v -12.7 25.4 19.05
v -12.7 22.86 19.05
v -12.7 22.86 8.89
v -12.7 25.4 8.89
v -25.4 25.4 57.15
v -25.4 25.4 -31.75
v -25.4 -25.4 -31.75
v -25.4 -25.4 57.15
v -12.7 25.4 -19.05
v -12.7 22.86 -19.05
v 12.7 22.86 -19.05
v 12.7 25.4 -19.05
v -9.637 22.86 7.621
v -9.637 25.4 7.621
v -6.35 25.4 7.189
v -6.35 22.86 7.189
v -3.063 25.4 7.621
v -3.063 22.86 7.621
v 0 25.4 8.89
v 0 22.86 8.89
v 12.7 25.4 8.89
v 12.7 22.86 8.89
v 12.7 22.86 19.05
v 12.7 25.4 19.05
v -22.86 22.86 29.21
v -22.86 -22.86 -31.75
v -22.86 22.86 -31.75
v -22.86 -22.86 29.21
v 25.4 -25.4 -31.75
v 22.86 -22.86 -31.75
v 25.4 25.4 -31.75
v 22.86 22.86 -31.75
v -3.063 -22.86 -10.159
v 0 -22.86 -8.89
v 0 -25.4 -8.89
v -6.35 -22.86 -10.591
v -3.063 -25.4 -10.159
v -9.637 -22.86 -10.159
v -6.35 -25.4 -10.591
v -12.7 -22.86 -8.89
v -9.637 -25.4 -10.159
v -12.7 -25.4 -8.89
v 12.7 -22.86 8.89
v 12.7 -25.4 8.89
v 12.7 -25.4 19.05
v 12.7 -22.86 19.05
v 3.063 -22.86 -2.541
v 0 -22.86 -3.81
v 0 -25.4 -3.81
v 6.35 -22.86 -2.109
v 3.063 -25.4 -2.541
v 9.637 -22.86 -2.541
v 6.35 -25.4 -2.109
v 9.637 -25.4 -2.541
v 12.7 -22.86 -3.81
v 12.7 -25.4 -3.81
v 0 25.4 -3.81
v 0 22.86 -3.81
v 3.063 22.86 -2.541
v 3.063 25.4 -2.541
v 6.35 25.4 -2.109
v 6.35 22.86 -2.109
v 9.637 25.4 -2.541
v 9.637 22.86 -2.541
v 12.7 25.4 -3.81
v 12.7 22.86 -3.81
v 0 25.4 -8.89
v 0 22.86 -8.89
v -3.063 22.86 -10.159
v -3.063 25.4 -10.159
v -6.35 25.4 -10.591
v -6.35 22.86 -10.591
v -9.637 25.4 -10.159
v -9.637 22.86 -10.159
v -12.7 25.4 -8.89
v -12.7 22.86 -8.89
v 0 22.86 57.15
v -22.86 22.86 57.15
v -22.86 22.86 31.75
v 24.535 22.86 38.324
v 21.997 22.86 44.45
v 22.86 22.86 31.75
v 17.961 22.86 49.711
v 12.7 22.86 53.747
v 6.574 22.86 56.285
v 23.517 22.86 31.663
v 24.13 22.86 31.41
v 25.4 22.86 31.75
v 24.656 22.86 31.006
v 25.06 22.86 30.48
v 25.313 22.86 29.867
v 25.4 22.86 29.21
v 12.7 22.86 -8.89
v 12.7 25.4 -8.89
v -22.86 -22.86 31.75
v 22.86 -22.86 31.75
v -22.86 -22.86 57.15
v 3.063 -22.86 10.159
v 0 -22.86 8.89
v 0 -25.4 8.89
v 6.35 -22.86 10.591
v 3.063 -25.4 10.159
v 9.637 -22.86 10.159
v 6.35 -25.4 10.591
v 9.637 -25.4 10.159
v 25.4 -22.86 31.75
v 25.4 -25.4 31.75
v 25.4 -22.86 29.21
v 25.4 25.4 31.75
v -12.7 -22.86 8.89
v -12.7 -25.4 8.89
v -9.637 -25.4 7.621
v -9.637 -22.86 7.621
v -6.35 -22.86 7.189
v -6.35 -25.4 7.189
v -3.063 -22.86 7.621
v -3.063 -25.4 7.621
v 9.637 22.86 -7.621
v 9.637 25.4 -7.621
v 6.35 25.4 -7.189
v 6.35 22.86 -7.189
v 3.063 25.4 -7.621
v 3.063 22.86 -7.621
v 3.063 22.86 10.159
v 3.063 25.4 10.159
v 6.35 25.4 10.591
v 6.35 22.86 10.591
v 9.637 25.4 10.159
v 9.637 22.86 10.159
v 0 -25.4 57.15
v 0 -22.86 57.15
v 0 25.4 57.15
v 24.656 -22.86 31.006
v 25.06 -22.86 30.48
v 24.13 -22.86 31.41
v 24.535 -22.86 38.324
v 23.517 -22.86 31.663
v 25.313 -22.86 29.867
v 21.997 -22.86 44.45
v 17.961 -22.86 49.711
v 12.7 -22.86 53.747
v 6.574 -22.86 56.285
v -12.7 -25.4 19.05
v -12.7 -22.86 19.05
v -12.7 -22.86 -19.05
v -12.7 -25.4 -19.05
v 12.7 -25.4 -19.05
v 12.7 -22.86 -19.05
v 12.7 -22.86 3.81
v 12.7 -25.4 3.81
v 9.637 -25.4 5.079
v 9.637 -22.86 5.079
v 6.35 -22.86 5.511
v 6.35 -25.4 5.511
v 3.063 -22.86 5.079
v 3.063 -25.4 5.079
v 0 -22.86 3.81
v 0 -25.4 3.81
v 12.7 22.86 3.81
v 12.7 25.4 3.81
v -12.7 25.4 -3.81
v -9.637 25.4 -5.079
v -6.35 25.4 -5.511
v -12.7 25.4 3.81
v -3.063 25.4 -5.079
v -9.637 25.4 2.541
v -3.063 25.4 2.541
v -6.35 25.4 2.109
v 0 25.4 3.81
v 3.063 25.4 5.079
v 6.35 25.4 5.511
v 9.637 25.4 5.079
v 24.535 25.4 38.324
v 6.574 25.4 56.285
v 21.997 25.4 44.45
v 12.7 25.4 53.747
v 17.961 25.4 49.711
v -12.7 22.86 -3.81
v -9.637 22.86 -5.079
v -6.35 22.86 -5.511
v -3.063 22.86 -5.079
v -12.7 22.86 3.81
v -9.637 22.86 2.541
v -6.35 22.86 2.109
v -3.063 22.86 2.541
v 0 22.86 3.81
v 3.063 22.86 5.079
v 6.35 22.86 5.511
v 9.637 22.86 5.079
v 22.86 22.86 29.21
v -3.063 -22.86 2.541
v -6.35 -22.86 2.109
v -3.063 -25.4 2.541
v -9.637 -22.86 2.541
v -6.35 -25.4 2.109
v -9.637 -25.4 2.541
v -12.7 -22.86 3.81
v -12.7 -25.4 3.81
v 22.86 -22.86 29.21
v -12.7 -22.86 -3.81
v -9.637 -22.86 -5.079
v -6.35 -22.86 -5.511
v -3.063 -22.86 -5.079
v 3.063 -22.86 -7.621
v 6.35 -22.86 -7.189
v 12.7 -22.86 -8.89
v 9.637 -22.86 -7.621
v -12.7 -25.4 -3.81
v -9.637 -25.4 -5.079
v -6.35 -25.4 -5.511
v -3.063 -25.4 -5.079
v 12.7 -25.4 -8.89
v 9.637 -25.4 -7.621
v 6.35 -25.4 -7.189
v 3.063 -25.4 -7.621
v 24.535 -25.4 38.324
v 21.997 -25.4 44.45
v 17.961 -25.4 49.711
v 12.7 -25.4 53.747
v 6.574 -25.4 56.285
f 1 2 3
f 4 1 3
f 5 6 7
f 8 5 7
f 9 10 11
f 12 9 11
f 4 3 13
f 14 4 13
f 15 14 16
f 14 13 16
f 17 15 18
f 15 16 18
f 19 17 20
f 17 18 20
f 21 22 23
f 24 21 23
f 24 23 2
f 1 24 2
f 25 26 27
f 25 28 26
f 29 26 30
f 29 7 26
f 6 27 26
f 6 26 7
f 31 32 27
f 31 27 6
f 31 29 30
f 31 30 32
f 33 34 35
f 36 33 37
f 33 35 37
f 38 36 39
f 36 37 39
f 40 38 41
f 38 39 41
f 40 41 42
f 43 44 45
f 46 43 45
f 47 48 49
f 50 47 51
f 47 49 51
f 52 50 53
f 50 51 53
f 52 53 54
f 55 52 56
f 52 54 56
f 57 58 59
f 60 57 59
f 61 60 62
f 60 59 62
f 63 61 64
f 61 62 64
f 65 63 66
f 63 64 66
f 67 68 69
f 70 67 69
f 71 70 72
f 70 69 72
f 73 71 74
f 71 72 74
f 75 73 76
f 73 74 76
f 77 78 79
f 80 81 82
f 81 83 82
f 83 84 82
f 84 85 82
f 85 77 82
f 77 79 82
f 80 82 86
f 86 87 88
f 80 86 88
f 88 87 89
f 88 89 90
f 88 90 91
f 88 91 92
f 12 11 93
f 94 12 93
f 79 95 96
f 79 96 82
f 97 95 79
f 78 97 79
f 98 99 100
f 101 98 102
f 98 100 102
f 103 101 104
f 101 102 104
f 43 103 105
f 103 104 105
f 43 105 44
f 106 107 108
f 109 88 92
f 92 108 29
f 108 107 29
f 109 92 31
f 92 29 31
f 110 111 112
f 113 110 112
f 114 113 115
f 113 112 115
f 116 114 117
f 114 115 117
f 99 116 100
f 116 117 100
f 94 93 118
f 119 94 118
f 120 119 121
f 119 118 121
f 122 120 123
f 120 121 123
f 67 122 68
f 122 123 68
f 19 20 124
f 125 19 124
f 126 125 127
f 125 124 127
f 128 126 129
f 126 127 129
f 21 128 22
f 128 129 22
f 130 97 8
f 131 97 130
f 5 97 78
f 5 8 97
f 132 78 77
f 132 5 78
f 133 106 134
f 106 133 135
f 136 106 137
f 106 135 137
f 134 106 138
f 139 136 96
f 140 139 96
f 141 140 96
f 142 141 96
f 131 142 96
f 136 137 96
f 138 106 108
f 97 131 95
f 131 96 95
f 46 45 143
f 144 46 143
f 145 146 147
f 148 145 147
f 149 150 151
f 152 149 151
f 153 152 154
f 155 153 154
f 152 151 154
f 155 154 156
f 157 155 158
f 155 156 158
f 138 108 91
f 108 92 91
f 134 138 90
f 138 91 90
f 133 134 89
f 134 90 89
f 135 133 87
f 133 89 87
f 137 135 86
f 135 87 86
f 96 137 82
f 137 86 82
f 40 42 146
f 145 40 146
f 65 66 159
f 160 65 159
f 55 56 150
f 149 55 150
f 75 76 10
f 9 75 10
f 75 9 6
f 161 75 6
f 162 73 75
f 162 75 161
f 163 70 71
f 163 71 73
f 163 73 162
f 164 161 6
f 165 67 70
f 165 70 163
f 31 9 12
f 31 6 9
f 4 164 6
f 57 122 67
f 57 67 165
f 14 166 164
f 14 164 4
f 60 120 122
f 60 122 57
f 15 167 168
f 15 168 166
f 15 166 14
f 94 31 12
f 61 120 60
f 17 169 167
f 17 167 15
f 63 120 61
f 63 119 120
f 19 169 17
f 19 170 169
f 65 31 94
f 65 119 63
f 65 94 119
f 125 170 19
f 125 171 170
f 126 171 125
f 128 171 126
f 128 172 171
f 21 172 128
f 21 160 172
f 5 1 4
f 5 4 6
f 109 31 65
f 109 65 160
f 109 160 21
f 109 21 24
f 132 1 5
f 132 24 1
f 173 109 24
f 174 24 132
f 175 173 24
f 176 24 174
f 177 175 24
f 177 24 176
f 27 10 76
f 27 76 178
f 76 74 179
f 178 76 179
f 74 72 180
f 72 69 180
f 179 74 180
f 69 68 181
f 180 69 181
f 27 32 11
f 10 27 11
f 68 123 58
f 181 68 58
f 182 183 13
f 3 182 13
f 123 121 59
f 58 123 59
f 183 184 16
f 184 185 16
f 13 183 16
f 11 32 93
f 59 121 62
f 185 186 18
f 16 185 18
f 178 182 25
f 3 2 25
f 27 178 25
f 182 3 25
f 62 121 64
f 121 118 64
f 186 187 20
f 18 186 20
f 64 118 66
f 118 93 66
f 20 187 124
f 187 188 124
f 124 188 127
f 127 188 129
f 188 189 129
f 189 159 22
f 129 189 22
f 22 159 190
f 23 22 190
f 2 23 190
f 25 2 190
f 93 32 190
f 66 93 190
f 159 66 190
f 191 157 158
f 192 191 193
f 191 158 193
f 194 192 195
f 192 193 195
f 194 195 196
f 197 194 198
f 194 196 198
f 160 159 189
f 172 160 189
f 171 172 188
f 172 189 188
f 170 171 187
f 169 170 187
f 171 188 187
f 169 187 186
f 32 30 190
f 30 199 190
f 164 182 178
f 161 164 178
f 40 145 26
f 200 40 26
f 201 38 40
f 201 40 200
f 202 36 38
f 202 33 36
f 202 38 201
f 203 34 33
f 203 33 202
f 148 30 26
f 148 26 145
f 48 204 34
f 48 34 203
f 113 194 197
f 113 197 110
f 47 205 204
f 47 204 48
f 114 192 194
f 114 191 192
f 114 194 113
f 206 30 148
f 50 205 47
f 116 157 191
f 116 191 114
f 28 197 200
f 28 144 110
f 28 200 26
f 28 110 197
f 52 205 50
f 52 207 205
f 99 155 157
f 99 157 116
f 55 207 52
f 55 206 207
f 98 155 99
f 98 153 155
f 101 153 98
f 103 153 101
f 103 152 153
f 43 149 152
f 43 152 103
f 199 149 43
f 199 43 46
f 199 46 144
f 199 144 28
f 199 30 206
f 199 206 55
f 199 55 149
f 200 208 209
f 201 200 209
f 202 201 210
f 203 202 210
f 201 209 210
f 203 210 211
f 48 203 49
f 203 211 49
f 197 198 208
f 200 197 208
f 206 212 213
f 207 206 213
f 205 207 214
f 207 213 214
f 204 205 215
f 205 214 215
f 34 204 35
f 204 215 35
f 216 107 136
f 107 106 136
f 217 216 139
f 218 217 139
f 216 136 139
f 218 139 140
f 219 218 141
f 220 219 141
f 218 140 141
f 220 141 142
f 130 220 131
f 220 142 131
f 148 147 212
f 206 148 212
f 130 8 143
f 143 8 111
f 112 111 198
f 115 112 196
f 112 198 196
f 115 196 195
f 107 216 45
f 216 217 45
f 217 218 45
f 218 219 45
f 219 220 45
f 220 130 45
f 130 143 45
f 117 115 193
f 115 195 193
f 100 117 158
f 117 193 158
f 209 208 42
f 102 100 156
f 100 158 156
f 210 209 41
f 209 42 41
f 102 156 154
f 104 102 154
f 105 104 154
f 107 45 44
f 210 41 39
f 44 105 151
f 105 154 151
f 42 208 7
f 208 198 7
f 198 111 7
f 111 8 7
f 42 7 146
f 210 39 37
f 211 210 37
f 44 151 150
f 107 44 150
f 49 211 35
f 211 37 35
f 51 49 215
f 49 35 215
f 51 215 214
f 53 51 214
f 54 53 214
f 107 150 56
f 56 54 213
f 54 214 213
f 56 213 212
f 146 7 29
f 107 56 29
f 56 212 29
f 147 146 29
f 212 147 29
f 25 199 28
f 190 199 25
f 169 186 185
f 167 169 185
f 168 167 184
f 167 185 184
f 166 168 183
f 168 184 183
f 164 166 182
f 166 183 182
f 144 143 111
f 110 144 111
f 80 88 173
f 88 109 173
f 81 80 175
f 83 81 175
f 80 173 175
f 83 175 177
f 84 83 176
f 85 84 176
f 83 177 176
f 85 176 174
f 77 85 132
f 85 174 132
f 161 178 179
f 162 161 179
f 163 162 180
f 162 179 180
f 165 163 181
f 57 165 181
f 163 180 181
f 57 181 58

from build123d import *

# Parameters (mm, degrees)
F0_W     = 50.8
F0_H     = 63.5
F1_DEPTH = 25.4
F2_T     = -2.54
F4_DEPTH = 25.4
F5_R     = 25.4
F6_R     = 2.54
F8_DEPTH = 50.8


with BuildPart() as f1:
    # F0 (on Right) → F1 (new body, symmetric)
    with BuildSketch(Plane.YZ):
        Rectangle(F0_W, F0_H)
        Polygon((12.7, -2.54), (12.7, -12.7), (-12.7, -12.7), (-12.7, -2.54), (-12.7, 2.54), (-12.7, 10.16), (-12.7, 15.24), (-12.7, 25.4), (12.7, 25.4), (12.7, 15.24), (12.7, 10.16), (12.7, 2.54), align=None, mode=Mode.SUBTRACT)
        with BuildLine():
            Line((-12.7, -12.7), (12.7, -12.7))
            Line((12.7, -12.7), (12.7, -2.54))
            ThreePointArc((12.7, -2.54), (6.35, -0.8385226281), (0, -2.54))
            ThreePointArc((0, -2.54), (-6.35, -4.2414773719), (-12.7, -2.54))
            Line((-12.7, -2.54), (-12.7, -12.7))
        make_face()
        with BuildLine():
            ThreePointArc((0, 15.24), (6.35, 16.9414773719), (12.7, 15.24))
            Line((12.7, 15.24), (12.7, 25.4))
            Line((12.7, 25.4), (-12.7, 25.4))
            Line((-12.7, 25.4), (-12.7, 15.24))
            ThreePointArc((-12.7, 15.24), (-6.35, 13.5385226281), (0, 15.24))
        make_face()
        with BuildLine():
            ThreePointArc((0, 2.54), (6.35, 4.2414773719), (12.7, 2.54))
            Line((12.7, 2.54), (12.7, 10.16))
            ThreePointArc((12.7, 10.16), (6.35, 11.8614773719), (0, 10.16))
            ThreePointArc((0, 10.16), (-6.35, 8.4585226281), (-12.7, 10.16))
            Line((-12.7, 10.16), (-12.7, 2.54))
            ThreePointArc((-12.7, 2.54), (-6.35, 0.8385226281), (0, 2.54))
        make_face()
        with BuildLine():
            ThreePointArc((0, 10.16), (6.35, 11.8614773719), (12.7, 10.16))
            Line((12.7, 10.16), (12.7, 15.24))
            ThreePointArc((12.7, 15.24), (6.35, 16.9414773719), (0, 15.24))
            ThreePointArc((0, 15.24), (-6.35, 13.5385226281), (-12.7, 15.24))
            Line((-12.7, 15.24), (-12.7, 10.16))
            ThreePointArc((-12.7, 10.16), (-6.35, 8.4585226281), (0, 10.16))
        make_face()
        with BuildLine():
            ThreePointArc((0, -2.54), (6.35, -0.8385226281), (12.7, -2.54))
            Line((12.7, -2.54), (12.7, 2.54))
            ThreePointArc((12.7, 2.54), (6.35, 4.2414773719), (0, 2.54))
            ThreePointArc((0, 2.54), (-6.35, 0.8385226281), (-12.7, 2.54))
            Line((-12.7, 2.54), (-12.7, -2.54))
            ThreePointArc((-12.7, -2.54), (-6.35, -4.2414773719), (0, -2.54))
        make_face()
    extrude(amount=F1_DEPTH, both=True)

    # F2
    f2_openings = [f1.faces().sort_by_distance(p)[0] for p in [
        (0, 0, -31.75),
    ]]
    offset(amount=F2_T, openings=f2_openings)

    # F3 (on face) → F4 (join)
    with BuildSketch(Plane.XY.offset(31.75)):
        Polygon((25.4, -25.4), (25.4, -22.86), (-22.86, -22.86), (-22.86, 22.86), (25.4, 22.86), (25.4, 25.4), (-25.4, 25.4), (-25.4, -25.4), align=None)
    extrude(amount=F4_DEPTH)

    # F5
    f5_edges = [f1.edges().sort_by_distance(p)[0] for p in [
        (25.4, -24.13, 57.15),
        (25.4, 24.13, 57.15),
    ]]
    fillet(f5_edges, radius=F5_R)

    # F6
    f6_edges = [f1.edges().sort_by_distance(p)[0] for p in [
        (25.4, 0, 31.75),
    ]]
    fillet(f6_edges, radius=F6_R)

    # F7 (on face) → F8 (cut)
    with BuildSketch(Plane.XZ.offset(25.4)):
        with BuildLine():
            Line((-12.7, 19.05), (-12.7, 8.89))
            ThreePointArc((-12.7, 8.89), (-6.35, 7.1885226281), (0, 8.89))
            ThreePointArc((0, 8.89), (6.35, 10.5914773719), (12.7, 8.89))
            Line((12.7, 8.89), (12.7, 19.05))
            Line((12.7, 19.05), (-12.7, 19.05))
        make_face()
        with BuildLine():
            Line((-12.7, 3.81), (-12.7, -3.81))
            ThreePointArc((-12.7, -3.81), (-6.35, -5.5114773719), (0, -3.81))
            ThreePointArc((0, -3.81), (6.35, -2.1085226281), (12.7, -3.81))
            Line((12.7, -3.81), (12.7, 3.81))
            ThreePointArc((12.7, 3.81), (6.35, 5.5114773719), (0, 3.81))
            ThreePointArc((0, 3.81), (-6.35, 2.1085226281), (-12.7, 3.81))
        make_face()
        with BuildLine():
            Line((-12.7, -8.89), (-12.7, -19.05))
            Line((-12.7, -19.05), (12.7, -19.05))
            Line((12.7, -19.05), (12.7, -8.89))
            ThreePointArc((12.7, -8.89), (6.35, -7.1885226281), (0, -8.89))
            ThreePointArc((0, -8.89), (-6.35, -10.5914773719), (-12.7, -8.89))
        make_face()
    extrude(amount=-F8_DEPTH, mode=Mode.SUBTRACT)


solid = f1.part
